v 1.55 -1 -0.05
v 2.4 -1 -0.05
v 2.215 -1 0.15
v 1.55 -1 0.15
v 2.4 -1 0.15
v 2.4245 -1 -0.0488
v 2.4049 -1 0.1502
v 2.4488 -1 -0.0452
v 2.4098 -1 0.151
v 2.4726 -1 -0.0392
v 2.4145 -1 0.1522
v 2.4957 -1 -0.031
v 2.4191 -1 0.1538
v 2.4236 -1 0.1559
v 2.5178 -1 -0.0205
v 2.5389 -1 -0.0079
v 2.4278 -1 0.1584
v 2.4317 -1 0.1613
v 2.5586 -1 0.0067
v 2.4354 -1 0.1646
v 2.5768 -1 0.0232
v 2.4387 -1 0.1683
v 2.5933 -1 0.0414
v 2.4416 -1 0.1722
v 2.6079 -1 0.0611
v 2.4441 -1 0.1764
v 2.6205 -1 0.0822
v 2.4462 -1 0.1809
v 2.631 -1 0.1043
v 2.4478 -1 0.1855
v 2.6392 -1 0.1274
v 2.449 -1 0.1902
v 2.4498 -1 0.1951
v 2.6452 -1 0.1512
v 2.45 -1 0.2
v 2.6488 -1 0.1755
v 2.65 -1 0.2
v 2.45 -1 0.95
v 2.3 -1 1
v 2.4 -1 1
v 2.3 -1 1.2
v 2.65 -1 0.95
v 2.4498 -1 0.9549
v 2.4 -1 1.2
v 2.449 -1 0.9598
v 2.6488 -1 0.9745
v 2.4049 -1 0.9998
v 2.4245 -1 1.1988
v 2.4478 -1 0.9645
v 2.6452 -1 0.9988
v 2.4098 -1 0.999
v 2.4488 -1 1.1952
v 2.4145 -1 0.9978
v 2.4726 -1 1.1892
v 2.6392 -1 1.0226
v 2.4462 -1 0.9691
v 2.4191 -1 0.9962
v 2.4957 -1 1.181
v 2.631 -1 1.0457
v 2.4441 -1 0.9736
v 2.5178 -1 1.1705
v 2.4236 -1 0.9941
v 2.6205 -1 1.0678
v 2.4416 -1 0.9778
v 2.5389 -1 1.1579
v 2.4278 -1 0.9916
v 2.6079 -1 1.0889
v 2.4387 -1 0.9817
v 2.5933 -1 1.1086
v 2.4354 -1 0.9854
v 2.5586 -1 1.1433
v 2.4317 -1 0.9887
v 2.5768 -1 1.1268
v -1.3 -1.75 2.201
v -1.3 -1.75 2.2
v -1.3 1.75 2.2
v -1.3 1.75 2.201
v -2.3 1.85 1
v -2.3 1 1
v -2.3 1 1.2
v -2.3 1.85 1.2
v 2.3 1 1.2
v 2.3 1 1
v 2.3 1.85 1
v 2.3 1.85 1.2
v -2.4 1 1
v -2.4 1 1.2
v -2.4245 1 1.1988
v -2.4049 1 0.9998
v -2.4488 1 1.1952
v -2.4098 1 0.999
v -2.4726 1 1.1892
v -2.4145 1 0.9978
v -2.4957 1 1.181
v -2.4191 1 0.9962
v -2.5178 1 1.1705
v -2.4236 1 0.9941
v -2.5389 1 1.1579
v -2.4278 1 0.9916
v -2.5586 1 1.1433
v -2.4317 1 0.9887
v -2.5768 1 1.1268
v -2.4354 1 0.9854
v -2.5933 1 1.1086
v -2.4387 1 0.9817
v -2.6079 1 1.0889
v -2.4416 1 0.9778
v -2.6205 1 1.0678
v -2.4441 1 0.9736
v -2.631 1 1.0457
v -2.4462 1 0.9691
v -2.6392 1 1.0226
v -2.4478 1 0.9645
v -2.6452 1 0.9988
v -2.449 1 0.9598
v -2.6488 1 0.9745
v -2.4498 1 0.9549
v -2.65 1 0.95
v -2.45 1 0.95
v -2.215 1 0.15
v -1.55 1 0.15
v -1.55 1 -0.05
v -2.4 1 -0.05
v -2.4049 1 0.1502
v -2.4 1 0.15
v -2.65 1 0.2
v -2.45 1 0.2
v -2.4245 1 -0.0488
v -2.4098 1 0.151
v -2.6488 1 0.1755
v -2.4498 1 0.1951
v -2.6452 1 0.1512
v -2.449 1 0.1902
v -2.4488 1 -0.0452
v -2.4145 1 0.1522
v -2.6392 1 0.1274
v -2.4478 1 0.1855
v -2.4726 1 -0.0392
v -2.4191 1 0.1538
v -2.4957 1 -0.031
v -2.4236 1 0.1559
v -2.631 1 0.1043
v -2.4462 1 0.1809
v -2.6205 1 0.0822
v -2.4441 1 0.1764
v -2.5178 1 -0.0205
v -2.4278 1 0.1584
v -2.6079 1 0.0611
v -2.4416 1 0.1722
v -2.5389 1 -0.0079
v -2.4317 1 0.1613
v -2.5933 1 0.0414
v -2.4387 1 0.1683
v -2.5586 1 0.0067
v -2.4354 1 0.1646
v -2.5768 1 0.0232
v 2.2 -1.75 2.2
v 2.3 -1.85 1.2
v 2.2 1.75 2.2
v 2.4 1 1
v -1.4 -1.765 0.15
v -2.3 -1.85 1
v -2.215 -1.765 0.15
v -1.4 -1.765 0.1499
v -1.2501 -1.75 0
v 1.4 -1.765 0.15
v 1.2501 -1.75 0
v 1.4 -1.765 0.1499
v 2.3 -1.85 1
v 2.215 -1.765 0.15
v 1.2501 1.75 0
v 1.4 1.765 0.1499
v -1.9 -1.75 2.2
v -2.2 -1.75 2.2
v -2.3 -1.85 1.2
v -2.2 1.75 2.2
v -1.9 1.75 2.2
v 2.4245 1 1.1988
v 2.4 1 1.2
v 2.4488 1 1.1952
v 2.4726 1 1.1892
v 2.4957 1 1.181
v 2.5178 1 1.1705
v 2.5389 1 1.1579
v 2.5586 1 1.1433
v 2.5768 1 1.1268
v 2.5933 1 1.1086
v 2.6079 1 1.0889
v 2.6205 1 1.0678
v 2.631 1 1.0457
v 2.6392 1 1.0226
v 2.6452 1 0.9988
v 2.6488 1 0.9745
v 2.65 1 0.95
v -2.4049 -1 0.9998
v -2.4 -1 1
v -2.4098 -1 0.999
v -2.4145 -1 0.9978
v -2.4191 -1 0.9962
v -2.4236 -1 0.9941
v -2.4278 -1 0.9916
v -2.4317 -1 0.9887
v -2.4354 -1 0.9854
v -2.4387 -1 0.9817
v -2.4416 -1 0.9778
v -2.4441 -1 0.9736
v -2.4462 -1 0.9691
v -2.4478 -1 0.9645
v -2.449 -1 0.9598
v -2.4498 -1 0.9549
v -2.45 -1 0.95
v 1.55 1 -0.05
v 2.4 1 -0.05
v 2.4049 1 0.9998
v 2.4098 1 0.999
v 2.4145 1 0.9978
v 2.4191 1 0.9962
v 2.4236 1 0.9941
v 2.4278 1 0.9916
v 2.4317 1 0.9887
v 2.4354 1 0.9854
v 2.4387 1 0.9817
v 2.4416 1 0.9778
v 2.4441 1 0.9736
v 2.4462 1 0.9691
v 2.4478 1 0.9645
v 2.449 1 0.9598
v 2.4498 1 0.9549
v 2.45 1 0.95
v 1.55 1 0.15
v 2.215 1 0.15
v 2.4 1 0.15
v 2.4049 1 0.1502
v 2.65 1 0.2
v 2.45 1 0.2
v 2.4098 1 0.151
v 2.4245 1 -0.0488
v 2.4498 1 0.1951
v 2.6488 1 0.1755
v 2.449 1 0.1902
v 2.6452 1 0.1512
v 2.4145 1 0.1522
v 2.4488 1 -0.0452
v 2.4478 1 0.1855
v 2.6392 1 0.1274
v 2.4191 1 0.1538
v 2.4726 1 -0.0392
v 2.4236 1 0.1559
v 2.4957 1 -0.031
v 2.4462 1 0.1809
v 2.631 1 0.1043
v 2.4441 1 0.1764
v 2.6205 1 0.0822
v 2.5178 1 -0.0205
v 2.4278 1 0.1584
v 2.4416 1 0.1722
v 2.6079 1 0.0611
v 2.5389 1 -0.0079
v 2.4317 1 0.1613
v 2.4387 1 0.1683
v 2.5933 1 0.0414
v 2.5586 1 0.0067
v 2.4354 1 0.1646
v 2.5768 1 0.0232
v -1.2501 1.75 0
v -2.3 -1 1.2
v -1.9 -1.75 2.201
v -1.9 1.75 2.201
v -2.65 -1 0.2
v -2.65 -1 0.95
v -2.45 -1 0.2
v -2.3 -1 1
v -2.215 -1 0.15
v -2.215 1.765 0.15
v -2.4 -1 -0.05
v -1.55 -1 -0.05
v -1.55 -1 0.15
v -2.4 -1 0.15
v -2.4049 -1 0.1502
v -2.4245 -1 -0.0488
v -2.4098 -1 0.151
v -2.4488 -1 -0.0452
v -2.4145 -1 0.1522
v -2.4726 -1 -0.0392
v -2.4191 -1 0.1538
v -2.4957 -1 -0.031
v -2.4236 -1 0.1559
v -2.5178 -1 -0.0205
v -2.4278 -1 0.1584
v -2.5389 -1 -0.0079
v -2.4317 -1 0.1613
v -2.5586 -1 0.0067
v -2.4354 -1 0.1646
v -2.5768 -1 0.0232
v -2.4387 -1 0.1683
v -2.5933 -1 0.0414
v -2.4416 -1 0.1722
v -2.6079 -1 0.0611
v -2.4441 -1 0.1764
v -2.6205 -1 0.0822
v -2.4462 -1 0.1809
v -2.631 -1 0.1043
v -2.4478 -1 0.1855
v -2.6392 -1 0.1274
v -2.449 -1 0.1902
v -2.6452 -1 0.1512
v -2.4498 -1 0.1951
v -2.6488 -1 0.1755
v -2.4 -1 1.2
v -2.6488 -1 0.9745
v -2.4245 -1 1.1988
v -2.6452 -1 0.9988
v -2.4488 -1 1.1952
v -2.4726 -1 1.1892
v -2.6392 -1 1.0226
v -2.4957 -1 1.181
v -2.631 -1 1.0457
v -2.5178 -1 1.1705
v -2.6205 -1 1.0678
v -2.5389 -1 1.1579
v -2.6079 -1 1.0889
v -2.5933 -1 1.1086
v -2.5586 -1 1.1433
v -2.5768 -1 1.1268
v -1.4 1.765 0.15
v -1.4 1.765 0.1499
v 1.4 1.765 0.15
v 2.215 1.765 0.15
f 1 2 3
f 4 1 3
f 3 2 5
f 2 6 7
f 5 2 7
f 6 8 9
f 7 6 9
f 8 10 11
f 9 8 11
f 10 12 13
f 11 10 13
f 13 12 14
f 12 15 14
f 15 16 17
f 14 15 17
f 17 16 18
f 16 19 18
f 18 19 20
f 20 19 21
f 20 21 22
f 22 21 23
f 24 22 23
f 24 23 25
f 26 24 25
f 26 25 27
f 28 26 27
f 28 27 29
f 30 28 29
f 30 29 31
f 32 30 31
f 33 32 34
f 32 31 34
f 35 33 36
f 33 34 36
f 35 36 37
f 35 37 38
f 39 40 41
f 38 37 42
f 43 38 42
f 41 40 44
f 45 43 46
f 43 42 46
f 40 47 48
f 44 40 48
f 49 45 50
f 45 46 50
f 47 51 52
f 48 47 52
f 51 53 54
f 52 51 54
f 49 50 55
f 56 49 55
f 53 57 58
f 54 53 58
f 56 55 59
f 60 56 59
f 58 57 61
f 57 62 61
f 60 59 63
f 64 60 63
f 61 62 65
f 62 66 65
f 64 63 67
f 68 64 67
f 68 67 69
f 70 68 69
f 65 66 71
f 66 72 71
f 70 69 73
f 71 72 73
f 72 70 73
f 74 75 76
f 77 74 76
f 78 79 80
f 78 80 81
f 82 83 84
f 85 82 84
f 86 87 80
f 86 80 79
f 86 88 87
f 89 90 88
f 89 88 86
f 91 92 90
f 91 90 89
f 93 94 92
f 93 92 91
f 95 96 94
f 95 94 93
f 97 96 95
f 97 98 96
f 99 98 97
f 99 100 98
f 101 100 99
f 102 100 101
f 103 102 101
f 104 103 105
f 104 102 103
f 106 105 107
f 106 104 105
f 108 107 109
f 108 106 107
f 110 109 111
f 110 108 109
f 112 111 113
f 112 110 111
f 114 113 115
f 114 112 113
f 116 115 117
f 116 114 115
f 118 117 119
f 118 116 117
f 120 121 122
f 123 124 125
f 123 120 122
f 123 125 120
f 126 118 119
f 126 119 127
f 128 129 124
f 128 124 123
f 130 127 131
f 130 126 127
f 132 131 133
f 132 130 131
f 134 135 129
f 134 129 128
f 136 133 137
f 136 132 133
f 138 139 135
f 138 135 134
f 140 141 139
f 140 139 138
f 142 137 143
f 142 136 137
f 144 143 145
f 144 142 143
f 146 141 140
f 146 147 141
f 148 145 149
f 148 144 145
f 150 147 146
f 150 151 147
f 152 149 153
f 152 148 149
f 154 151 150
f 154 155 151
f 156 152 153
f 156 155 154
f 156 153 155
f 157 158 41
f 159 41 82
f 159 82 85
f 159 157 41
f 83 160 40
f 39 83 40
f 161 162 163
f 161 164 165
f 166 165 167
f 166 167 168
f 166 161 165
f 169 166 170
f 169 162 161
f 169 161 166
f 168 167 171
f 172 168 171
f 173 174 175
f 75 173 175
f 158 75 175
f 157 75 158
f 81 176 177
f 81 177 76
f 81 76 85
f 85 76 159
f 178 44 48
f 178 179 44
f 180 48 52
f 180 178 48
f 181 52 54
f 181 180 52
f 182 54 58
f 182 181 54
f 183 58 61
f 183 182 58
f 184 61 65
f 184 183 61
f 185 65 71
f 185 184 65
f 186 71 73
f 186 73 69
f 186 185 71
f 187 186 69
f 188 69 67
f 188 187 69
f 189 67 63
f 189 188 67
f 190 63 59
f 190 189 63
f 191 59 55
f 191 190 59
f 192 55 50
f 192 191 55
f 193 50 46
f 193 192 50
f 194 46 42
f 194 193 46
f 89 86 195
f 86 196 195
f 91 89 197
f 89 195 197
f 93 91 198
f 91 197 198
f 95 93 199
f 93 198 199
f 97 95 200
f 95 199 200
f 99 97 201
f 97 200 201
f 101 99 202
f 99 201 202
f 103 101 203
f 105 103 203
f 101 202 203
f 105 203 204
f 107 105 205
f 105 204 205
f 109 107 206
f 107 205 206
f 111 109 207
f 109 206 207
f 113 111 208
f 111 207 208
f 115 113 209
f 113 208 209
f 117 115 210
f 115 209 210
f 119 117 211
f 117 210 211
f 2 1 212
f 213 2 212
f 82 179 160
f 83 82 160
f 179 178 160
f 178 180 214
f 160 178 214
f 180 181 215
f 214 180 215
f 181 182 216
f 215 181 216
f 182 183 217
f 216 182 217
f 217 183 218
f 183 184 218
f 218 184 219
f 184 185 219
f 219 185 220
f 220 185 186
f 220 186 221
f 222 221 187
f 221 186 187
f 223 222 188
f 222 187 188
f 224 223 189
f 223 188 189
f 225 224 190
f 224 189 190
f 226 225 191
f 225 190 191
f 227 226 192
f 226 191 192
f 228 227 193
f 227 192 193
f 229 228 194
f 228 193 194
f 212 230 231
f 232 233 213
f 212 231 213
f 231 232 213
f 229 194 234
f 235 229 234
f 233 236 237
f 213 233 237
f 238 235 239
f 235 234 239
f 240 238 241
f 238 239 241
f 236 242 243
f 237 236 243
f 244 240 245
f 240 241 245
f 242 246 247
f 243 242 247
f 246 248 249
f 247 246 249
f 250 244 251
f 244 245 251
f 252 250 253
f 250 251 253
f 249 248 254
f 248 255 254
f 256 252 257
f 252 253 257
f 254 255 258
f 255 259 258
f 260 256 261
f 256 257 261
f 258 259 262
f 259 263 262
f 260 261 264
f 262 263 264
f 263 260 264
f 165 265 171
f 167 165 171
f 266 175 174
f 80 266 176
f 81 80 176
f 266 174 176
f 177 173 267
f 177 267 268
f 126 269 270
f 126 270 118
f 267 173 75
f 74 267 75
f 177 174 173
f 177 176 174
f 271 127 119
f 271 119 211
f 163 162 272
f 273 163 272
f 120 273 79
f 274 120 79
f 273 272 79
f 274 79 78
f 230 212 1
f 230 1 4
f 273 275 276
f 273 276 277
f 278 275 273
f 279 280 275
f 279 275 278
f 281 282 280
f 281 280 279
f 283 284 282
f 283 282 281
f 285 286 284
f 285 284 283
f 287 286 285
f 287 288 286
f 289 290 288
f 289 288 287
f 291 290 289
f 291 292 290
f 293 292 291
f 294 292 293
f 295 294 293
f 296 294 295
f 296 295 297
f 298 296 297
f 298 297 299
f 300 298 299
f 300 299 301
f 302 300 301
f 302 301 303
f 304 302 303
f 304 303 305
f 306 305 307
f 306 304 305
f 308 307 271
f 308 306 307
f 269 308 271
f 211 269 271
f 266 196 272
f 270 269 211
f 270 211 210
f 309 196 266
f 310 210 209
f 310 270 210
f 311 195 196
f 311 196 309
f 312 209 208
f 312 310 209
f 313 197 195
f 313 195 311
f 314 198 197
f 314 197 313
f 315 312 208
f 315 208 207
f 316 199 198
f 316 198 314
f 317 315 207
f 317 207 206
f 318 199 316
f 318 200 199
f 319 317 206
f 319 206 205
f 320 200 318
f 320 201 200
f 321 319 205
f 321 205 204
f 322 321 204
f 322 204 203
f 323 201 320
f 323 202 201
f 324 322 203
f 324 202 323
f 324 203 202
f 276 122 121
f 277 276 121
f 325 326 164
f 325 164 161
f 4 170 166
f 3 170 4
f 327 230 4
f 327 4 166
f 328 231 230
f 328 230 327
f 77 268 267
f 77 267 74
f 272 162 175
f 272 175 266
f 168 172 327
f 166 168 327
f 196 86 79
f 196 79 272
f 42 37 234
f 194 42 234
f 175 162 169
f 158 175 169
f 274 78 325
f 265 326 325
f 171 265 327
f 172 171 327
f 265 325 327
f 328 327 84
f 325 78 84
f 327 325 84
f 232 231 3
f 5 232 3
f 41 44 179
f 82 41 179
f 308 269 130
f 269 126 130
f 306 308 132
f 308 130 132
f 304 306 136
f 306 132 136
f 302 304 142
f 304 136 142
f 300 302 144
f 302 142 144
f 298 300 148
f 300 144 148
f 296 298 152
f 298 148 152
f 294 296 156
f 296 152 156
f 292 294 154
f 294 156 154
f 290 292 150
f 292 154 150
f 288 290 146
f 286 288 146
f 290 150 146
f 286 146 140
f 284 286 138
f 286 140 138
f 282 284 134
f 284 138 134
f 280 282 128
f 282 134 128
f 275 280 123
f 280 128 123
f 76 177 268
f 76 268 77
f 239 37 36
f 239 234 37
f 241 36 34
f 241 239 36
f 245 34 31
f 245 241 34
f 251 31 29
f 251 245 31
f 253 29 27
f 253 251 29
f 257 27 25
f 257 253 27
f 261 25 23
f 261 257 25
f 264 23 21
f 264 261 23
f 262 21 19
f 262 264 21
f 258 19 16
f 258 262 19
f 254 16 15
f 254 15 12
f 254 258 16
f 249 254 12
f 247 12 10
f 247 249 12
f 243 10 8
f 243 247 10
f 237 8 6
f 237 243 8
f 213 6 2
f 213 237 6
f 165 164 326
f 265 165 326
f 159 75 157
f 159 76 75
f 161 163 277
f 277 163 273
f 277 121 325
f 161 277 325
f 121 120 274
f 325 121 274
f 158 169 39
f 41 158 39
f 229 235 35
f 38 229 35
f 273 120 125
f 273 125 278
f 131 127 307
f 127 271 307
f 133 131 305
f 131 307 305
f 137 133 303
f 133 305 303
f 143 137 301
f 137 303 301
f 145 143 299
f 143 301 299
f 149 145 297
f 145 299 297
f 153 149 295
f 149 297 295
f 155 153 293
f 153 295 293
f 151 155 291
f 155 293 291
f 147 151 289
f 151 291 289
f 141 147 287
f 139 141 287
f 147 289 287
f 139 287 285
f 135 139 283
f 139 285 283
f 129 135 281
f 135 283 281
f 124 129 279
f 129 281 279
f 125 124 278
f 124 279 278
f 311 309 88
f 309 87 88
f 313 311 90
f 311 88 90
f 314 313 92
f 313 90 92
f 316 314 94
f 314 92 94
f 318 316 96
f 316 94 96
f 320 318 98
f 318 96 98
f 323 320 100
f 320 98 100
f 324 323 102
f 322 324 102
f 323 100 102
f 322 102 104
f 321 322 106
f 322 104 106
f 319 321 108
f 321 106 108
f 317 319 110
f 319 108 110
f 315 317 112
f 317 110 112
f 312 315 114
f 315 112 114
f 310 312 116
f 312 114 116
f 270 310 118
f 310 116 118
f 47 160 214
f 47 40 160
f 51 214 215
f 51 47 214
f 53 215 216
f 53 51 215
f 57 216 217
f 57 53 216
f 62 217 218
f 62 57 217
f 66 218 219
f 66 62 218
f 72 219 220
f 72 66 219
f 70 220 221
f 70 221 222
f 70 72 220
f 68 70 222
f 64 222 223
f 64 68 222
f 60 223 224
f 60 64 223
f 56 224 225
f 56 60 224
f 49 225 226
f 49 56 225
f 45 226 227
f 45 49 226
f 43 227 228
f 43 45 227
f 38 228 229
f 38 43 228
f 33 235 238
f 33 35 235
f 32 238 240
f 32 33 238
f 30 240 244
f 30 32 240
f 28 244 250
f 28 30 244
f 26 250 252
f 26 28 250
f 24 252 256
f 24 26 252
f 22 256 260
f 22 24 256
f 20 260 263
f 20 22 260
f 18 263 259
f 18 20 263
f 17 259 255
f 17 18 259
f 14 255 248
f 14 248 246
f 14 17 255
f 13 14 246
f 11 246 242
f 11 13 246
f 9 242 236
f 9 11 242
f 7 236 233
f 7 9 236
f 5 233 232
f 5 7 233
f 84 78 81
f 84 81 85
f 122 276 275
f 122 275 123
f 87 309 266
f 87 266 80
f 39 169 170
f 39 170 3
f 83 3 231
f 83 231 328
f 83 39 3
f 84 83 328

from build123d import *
from OCP.BRepFilletAPI import BRepFilletAPI_MakeChamfer

# Parameters (mm, degrees)
SZKIC1_W                    = 4.6
SZKIC1_H                    = 3.7
DODANIE_WYCI_GNI_CIE1_DEPTH = 2.2
SFAZOWANIE1_SIZE            = 1
SFAZOWANIE1_SIZE2           = 0.1
SFAZOWANIE2_SIZE            = 0.1
SFAZOWANIE2_SIZE2           = 1
SZKIC2_W                    = 0.6
SZKIC2_H                    = 3.5
DODANIE_WYCI_GNI_CIE2_DEPTH = 0.001
SZKIC5_W                    = 0.15
SZKIC5_H                    = 3.7
WYTNIJ_WYCI_GNI_CIE1_DEPTH  = 0.9
SFAZOWANIE3_SIZE            = 0.15
SZKIC3_W                    = 0.2
SZKIC3_H                    = 2
SFAZOWANIE3_OF_LUSTRO1_SIZE = 0.15


with BuildPart() as part:
    # Szkic1 → Dodanie-wyciągnięcie1 (new body)
    with BuildSketch(Plane.XY):
        Rectangle(SZKIC1_W, SZKIC1_H)
    extrude(amount=DODANIE_WYCI_GNI_CIE1_DEPTH)

    # Sfazowanie1: one chamfer whose edges measure the first distance from different faces: ONE call of the kernel's chamfer builder (chamfer() names one face for all edges)
    sfazowanie1_edges_1 = [part.edges().sort_by_distance(p)[0] for p in [
        (2.3, 0, 2.2),
    ]]
    sfazowanie1_side_1 = [part.faces().sort_by_distance(p)[0] for p in [
        (2.3, 0, 1.1),
    ]]
    sfazowanie1_edges_2 = [part.edges().sort_by_distance(p)[0] for p in [
        (0, 1.85, 2.2),
    ]]
    sfazowanie1_side_2 = [part.faces().sort_by_distance(p)[0] for p in [
        (0, 1.85, 1.1),
    ]]
    sfazowanie1_edges_3 = [part.edges().sort_by_distance(p)[0] for p in [
        (-2.3, 0, 2.2),
    ]]
    sfazowanie1_side_3 = [part.faces().sort_by_distance(p)[0] for p in [
        (-2.3, 0, 1.1),
    ]]
    sfazowanie1_edges_4 = [part.edges().sort_by_distance(p)[0] for p in [
        (0, -1.85, 2.2),
    ]]
    sfazowanie1_side_4 = [part.faces().sort_by_distance(p)[0] for p in [
        (0, -1.85, 1.1),
    ]]
    sfazowanie1 = BRepFilletAPI_MakeChamfer(part.part.solid().wrapped)
    for e in sfazowanie1_edges_1:
        sfazowanie1.Add(SFAZOWANIE1_SIZE, SFAZOWANIE1_SIZE2, e.wrapped, sfazowanie1_side_1[0].wrapped)  # the first distance lies on this face
    for e in sfazowanie1_edges_2:
        sfazowanie1.Add(SFAZOWANIE1_SIZE, SFAZOWANIE1_SIZE2, e.wrapped, sfazowanie1_side_2[0].wrapped)  # the first distance lies on this face
    for e in sfazowanie1_edges_3:
        sfazowanie1.Add(SFAZOWANIE1_SIZE, SFAZOWANIE1_SIZE2, e.wrapped, sfazowanie1_side_3[0].wrapped)  # the first distance lies on this face
    for e in sfazowanie1_edges_4:
        sfazowanie1.Add(SFAZOWANIE1_SIZE, SFAZOWANIE1_SIZE2, e.wrapped, sfazowanie1_side_4[0].wrapped)  # the first distance lies on this face
    add(Compound.cast(sfazowanie1.Shape()), mode=Mode.REPLACE)

    # Sfazowanie2
    sfazowanie2_edges = [part.edges().sort_by_distance(p)[0] for p in [
        (0, 1.85, 0),
        (2.3, 0, 0),
        (0, -1.85, 0),
        (-2.3, 0, 0),
    ]]
    sfazowanie2_side = [part.faces().sort_by_distance(p)[0] for p in [
        (0, 0, 0),
    ]]
    chamfer(sfazowanie2_edges, length=SFAZOWANIE2_SIZE, length2=SFAZOWANIE2_SIZE2, reference=sfazowanie2_side[0])

    # Szkic2 → Dodanie-wyciągnięcie2 (add)
    with BuildSketch(Plane.XY.offset(2.2)):
        with Locations((-1.6, 0)):
            Rectangle(SZKIC2_W, SZKIC2_H)
    extrude(amount=DODANIE_WYCI_GNI_CIE2_DEPTH)

    # Szkic5 → Wytnij-wyciągnięcie1 (cut)
    with BuildSketch(Plane.ZY.offset(2.3)):
        with Locations((0.075, 0)):
            Rectangle(SZKIC5_W, SZKIC5_H)
    wytnij_wyci_gni_cie1 = extrude(amount=-WYTNIJ_WYCI_GNI_CIE1_DEPTH, mode=Mode.SUBTRACT)

    # Sfazowanie3
    sfazowanie3_edges = [part.edges().sort_by_distance(p)[0] for p in [
        (-1.4, 0, 0),
    ]]
    chamfer(sfazowanie3_edges, length=SFAZOWANIE3_SIZE - 0.0001)  # a hair under: the kernel refuses the full size

    # Wyciągnięcie po ścieżce1: sweep along a path in Szkic4
    with BuildLine(Plane(origin=(0, 0, 0), x_dir=(1, 0, 0), z_dir=(0, 1, 0))) as wyci_gni_cie_po_cie_ce1_path:
        Line((-2.3, -1.2), (-2.4, -1.2))
        ThreePointArc((-2.4, -1.2), (-2.576776695, -1.126776695), (-2.65, -0.95))
        Line((-2.65, -0.95), (-2.65, -0.2))
        ThreePointArc((-2.65, -0.2), (-2.576776695, -0.023223305), (-2.4, 0.05))
        Line((-2.4, 0.05), (-1.55, 0.05))
    # Szkic3 → Wyciągnięcie po ścieżce1 (sweep)
    with BuildSketch(Plane.ZY.offset(2.3)):
        with Locations((1.1, 0)):
            Rectangle(SZKIC3_W, SZKIC3_H)
    wyci_gni_cie_po_cie_ce1 = sweep(path=wyci_gni_cie_po_cie_ce1_path.line)

    # Lustro1: Wytnij-wyciągnięcie1, Wyciągnięcie po ścieżce1 across plane
    add(wytnij_wyci_gni_cie1.mirror(Plane(origin=(0, 0, 0), x_dir=(0, 0, 1), z_dir=(1, 0, 0))), mode=Mode.SUBTRACT)
    add(wyci_gni_cie_po_cie_ce1.mirror(Plane(origin=(0, 0, 0), x_dir=(0, 0, 1), z_dir=(1, 0, 0))))

    # Sfazowanie3 of Lustro1
    sfazowanie3_of_lustro1_edges = [part.edges().sort_by_distance(p)[0] for p in [
        (1.4, 0, 0),
    ]]
    chamfer(sfazowanie3_of_lustro1_edges, length=SFAZOWANIE3_OF_LUSTRO1_SIZE - 0.0001)  # a hair under: the kernel refuses the full size


solid = part.part
